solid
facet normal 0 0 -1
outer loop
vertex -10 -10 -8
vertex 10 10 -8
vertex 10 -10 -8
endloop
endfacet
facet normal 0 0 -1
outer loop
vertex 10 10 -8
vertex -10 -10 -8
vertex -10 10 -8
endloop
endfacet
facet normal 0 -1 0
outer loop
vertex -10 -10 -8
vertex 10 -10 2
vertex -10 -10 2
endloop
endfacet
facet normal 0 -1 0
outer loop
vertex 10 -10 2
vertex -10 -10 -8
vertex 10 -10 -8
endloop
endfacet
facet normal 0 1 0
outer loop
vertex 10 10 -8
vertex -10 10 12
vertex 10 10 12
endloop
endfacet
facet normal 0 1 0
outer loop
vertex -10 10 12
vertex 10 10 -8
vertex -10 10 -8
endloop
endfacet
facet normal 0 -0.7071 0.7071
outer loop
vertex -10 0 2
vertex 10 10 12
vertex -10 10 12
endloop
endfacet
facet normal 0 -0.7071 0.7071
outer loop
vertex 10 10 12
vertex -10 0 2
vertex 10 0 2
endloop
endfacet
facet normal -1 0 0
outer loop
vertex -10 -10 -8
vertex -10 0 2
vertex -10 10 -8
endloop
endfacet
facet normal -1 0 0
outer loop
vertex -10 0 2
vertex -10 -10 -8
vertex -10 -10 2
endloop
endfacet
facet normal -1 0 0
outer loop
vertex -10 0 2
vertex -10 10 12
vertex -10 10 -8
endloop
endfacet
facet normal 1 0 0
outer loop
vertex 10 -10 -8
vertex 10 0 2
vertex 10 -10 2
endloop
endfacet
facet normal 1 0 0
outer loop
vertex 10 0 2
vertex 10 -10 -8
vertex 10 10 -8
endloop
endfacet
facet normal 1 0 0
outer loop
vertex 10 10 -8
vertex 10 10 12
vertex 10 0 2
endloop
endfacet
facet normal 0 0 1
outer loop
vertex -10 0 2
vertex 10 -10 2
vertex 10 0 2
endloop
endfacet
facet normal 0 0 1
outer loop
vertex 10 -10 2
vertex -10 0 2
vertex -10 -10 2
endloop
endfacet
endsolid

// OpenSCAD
translate([0,0,2]) scale(10) translate([-1,-1,-1]) {
    polyhedron(
        points=[
            [0,0,0],
            [2,0,0],
            [0,2,0],
            [2,2,0],
            [0,0,1],
            [2,0,1],
            [0,2,2],
            [2,2,2],
            [0,1,1],
            [2,1,1],
        ],
        faces=[
            [0,1,3,2],
            [1,0,4,5],
            [2,3,7,6],
            [9,8,6,7],
            [0,2,8,4], [2,6,8],
            [3,1,5,9], [9,7,3],
            [4,8,9,5]
        ]
    );
}
